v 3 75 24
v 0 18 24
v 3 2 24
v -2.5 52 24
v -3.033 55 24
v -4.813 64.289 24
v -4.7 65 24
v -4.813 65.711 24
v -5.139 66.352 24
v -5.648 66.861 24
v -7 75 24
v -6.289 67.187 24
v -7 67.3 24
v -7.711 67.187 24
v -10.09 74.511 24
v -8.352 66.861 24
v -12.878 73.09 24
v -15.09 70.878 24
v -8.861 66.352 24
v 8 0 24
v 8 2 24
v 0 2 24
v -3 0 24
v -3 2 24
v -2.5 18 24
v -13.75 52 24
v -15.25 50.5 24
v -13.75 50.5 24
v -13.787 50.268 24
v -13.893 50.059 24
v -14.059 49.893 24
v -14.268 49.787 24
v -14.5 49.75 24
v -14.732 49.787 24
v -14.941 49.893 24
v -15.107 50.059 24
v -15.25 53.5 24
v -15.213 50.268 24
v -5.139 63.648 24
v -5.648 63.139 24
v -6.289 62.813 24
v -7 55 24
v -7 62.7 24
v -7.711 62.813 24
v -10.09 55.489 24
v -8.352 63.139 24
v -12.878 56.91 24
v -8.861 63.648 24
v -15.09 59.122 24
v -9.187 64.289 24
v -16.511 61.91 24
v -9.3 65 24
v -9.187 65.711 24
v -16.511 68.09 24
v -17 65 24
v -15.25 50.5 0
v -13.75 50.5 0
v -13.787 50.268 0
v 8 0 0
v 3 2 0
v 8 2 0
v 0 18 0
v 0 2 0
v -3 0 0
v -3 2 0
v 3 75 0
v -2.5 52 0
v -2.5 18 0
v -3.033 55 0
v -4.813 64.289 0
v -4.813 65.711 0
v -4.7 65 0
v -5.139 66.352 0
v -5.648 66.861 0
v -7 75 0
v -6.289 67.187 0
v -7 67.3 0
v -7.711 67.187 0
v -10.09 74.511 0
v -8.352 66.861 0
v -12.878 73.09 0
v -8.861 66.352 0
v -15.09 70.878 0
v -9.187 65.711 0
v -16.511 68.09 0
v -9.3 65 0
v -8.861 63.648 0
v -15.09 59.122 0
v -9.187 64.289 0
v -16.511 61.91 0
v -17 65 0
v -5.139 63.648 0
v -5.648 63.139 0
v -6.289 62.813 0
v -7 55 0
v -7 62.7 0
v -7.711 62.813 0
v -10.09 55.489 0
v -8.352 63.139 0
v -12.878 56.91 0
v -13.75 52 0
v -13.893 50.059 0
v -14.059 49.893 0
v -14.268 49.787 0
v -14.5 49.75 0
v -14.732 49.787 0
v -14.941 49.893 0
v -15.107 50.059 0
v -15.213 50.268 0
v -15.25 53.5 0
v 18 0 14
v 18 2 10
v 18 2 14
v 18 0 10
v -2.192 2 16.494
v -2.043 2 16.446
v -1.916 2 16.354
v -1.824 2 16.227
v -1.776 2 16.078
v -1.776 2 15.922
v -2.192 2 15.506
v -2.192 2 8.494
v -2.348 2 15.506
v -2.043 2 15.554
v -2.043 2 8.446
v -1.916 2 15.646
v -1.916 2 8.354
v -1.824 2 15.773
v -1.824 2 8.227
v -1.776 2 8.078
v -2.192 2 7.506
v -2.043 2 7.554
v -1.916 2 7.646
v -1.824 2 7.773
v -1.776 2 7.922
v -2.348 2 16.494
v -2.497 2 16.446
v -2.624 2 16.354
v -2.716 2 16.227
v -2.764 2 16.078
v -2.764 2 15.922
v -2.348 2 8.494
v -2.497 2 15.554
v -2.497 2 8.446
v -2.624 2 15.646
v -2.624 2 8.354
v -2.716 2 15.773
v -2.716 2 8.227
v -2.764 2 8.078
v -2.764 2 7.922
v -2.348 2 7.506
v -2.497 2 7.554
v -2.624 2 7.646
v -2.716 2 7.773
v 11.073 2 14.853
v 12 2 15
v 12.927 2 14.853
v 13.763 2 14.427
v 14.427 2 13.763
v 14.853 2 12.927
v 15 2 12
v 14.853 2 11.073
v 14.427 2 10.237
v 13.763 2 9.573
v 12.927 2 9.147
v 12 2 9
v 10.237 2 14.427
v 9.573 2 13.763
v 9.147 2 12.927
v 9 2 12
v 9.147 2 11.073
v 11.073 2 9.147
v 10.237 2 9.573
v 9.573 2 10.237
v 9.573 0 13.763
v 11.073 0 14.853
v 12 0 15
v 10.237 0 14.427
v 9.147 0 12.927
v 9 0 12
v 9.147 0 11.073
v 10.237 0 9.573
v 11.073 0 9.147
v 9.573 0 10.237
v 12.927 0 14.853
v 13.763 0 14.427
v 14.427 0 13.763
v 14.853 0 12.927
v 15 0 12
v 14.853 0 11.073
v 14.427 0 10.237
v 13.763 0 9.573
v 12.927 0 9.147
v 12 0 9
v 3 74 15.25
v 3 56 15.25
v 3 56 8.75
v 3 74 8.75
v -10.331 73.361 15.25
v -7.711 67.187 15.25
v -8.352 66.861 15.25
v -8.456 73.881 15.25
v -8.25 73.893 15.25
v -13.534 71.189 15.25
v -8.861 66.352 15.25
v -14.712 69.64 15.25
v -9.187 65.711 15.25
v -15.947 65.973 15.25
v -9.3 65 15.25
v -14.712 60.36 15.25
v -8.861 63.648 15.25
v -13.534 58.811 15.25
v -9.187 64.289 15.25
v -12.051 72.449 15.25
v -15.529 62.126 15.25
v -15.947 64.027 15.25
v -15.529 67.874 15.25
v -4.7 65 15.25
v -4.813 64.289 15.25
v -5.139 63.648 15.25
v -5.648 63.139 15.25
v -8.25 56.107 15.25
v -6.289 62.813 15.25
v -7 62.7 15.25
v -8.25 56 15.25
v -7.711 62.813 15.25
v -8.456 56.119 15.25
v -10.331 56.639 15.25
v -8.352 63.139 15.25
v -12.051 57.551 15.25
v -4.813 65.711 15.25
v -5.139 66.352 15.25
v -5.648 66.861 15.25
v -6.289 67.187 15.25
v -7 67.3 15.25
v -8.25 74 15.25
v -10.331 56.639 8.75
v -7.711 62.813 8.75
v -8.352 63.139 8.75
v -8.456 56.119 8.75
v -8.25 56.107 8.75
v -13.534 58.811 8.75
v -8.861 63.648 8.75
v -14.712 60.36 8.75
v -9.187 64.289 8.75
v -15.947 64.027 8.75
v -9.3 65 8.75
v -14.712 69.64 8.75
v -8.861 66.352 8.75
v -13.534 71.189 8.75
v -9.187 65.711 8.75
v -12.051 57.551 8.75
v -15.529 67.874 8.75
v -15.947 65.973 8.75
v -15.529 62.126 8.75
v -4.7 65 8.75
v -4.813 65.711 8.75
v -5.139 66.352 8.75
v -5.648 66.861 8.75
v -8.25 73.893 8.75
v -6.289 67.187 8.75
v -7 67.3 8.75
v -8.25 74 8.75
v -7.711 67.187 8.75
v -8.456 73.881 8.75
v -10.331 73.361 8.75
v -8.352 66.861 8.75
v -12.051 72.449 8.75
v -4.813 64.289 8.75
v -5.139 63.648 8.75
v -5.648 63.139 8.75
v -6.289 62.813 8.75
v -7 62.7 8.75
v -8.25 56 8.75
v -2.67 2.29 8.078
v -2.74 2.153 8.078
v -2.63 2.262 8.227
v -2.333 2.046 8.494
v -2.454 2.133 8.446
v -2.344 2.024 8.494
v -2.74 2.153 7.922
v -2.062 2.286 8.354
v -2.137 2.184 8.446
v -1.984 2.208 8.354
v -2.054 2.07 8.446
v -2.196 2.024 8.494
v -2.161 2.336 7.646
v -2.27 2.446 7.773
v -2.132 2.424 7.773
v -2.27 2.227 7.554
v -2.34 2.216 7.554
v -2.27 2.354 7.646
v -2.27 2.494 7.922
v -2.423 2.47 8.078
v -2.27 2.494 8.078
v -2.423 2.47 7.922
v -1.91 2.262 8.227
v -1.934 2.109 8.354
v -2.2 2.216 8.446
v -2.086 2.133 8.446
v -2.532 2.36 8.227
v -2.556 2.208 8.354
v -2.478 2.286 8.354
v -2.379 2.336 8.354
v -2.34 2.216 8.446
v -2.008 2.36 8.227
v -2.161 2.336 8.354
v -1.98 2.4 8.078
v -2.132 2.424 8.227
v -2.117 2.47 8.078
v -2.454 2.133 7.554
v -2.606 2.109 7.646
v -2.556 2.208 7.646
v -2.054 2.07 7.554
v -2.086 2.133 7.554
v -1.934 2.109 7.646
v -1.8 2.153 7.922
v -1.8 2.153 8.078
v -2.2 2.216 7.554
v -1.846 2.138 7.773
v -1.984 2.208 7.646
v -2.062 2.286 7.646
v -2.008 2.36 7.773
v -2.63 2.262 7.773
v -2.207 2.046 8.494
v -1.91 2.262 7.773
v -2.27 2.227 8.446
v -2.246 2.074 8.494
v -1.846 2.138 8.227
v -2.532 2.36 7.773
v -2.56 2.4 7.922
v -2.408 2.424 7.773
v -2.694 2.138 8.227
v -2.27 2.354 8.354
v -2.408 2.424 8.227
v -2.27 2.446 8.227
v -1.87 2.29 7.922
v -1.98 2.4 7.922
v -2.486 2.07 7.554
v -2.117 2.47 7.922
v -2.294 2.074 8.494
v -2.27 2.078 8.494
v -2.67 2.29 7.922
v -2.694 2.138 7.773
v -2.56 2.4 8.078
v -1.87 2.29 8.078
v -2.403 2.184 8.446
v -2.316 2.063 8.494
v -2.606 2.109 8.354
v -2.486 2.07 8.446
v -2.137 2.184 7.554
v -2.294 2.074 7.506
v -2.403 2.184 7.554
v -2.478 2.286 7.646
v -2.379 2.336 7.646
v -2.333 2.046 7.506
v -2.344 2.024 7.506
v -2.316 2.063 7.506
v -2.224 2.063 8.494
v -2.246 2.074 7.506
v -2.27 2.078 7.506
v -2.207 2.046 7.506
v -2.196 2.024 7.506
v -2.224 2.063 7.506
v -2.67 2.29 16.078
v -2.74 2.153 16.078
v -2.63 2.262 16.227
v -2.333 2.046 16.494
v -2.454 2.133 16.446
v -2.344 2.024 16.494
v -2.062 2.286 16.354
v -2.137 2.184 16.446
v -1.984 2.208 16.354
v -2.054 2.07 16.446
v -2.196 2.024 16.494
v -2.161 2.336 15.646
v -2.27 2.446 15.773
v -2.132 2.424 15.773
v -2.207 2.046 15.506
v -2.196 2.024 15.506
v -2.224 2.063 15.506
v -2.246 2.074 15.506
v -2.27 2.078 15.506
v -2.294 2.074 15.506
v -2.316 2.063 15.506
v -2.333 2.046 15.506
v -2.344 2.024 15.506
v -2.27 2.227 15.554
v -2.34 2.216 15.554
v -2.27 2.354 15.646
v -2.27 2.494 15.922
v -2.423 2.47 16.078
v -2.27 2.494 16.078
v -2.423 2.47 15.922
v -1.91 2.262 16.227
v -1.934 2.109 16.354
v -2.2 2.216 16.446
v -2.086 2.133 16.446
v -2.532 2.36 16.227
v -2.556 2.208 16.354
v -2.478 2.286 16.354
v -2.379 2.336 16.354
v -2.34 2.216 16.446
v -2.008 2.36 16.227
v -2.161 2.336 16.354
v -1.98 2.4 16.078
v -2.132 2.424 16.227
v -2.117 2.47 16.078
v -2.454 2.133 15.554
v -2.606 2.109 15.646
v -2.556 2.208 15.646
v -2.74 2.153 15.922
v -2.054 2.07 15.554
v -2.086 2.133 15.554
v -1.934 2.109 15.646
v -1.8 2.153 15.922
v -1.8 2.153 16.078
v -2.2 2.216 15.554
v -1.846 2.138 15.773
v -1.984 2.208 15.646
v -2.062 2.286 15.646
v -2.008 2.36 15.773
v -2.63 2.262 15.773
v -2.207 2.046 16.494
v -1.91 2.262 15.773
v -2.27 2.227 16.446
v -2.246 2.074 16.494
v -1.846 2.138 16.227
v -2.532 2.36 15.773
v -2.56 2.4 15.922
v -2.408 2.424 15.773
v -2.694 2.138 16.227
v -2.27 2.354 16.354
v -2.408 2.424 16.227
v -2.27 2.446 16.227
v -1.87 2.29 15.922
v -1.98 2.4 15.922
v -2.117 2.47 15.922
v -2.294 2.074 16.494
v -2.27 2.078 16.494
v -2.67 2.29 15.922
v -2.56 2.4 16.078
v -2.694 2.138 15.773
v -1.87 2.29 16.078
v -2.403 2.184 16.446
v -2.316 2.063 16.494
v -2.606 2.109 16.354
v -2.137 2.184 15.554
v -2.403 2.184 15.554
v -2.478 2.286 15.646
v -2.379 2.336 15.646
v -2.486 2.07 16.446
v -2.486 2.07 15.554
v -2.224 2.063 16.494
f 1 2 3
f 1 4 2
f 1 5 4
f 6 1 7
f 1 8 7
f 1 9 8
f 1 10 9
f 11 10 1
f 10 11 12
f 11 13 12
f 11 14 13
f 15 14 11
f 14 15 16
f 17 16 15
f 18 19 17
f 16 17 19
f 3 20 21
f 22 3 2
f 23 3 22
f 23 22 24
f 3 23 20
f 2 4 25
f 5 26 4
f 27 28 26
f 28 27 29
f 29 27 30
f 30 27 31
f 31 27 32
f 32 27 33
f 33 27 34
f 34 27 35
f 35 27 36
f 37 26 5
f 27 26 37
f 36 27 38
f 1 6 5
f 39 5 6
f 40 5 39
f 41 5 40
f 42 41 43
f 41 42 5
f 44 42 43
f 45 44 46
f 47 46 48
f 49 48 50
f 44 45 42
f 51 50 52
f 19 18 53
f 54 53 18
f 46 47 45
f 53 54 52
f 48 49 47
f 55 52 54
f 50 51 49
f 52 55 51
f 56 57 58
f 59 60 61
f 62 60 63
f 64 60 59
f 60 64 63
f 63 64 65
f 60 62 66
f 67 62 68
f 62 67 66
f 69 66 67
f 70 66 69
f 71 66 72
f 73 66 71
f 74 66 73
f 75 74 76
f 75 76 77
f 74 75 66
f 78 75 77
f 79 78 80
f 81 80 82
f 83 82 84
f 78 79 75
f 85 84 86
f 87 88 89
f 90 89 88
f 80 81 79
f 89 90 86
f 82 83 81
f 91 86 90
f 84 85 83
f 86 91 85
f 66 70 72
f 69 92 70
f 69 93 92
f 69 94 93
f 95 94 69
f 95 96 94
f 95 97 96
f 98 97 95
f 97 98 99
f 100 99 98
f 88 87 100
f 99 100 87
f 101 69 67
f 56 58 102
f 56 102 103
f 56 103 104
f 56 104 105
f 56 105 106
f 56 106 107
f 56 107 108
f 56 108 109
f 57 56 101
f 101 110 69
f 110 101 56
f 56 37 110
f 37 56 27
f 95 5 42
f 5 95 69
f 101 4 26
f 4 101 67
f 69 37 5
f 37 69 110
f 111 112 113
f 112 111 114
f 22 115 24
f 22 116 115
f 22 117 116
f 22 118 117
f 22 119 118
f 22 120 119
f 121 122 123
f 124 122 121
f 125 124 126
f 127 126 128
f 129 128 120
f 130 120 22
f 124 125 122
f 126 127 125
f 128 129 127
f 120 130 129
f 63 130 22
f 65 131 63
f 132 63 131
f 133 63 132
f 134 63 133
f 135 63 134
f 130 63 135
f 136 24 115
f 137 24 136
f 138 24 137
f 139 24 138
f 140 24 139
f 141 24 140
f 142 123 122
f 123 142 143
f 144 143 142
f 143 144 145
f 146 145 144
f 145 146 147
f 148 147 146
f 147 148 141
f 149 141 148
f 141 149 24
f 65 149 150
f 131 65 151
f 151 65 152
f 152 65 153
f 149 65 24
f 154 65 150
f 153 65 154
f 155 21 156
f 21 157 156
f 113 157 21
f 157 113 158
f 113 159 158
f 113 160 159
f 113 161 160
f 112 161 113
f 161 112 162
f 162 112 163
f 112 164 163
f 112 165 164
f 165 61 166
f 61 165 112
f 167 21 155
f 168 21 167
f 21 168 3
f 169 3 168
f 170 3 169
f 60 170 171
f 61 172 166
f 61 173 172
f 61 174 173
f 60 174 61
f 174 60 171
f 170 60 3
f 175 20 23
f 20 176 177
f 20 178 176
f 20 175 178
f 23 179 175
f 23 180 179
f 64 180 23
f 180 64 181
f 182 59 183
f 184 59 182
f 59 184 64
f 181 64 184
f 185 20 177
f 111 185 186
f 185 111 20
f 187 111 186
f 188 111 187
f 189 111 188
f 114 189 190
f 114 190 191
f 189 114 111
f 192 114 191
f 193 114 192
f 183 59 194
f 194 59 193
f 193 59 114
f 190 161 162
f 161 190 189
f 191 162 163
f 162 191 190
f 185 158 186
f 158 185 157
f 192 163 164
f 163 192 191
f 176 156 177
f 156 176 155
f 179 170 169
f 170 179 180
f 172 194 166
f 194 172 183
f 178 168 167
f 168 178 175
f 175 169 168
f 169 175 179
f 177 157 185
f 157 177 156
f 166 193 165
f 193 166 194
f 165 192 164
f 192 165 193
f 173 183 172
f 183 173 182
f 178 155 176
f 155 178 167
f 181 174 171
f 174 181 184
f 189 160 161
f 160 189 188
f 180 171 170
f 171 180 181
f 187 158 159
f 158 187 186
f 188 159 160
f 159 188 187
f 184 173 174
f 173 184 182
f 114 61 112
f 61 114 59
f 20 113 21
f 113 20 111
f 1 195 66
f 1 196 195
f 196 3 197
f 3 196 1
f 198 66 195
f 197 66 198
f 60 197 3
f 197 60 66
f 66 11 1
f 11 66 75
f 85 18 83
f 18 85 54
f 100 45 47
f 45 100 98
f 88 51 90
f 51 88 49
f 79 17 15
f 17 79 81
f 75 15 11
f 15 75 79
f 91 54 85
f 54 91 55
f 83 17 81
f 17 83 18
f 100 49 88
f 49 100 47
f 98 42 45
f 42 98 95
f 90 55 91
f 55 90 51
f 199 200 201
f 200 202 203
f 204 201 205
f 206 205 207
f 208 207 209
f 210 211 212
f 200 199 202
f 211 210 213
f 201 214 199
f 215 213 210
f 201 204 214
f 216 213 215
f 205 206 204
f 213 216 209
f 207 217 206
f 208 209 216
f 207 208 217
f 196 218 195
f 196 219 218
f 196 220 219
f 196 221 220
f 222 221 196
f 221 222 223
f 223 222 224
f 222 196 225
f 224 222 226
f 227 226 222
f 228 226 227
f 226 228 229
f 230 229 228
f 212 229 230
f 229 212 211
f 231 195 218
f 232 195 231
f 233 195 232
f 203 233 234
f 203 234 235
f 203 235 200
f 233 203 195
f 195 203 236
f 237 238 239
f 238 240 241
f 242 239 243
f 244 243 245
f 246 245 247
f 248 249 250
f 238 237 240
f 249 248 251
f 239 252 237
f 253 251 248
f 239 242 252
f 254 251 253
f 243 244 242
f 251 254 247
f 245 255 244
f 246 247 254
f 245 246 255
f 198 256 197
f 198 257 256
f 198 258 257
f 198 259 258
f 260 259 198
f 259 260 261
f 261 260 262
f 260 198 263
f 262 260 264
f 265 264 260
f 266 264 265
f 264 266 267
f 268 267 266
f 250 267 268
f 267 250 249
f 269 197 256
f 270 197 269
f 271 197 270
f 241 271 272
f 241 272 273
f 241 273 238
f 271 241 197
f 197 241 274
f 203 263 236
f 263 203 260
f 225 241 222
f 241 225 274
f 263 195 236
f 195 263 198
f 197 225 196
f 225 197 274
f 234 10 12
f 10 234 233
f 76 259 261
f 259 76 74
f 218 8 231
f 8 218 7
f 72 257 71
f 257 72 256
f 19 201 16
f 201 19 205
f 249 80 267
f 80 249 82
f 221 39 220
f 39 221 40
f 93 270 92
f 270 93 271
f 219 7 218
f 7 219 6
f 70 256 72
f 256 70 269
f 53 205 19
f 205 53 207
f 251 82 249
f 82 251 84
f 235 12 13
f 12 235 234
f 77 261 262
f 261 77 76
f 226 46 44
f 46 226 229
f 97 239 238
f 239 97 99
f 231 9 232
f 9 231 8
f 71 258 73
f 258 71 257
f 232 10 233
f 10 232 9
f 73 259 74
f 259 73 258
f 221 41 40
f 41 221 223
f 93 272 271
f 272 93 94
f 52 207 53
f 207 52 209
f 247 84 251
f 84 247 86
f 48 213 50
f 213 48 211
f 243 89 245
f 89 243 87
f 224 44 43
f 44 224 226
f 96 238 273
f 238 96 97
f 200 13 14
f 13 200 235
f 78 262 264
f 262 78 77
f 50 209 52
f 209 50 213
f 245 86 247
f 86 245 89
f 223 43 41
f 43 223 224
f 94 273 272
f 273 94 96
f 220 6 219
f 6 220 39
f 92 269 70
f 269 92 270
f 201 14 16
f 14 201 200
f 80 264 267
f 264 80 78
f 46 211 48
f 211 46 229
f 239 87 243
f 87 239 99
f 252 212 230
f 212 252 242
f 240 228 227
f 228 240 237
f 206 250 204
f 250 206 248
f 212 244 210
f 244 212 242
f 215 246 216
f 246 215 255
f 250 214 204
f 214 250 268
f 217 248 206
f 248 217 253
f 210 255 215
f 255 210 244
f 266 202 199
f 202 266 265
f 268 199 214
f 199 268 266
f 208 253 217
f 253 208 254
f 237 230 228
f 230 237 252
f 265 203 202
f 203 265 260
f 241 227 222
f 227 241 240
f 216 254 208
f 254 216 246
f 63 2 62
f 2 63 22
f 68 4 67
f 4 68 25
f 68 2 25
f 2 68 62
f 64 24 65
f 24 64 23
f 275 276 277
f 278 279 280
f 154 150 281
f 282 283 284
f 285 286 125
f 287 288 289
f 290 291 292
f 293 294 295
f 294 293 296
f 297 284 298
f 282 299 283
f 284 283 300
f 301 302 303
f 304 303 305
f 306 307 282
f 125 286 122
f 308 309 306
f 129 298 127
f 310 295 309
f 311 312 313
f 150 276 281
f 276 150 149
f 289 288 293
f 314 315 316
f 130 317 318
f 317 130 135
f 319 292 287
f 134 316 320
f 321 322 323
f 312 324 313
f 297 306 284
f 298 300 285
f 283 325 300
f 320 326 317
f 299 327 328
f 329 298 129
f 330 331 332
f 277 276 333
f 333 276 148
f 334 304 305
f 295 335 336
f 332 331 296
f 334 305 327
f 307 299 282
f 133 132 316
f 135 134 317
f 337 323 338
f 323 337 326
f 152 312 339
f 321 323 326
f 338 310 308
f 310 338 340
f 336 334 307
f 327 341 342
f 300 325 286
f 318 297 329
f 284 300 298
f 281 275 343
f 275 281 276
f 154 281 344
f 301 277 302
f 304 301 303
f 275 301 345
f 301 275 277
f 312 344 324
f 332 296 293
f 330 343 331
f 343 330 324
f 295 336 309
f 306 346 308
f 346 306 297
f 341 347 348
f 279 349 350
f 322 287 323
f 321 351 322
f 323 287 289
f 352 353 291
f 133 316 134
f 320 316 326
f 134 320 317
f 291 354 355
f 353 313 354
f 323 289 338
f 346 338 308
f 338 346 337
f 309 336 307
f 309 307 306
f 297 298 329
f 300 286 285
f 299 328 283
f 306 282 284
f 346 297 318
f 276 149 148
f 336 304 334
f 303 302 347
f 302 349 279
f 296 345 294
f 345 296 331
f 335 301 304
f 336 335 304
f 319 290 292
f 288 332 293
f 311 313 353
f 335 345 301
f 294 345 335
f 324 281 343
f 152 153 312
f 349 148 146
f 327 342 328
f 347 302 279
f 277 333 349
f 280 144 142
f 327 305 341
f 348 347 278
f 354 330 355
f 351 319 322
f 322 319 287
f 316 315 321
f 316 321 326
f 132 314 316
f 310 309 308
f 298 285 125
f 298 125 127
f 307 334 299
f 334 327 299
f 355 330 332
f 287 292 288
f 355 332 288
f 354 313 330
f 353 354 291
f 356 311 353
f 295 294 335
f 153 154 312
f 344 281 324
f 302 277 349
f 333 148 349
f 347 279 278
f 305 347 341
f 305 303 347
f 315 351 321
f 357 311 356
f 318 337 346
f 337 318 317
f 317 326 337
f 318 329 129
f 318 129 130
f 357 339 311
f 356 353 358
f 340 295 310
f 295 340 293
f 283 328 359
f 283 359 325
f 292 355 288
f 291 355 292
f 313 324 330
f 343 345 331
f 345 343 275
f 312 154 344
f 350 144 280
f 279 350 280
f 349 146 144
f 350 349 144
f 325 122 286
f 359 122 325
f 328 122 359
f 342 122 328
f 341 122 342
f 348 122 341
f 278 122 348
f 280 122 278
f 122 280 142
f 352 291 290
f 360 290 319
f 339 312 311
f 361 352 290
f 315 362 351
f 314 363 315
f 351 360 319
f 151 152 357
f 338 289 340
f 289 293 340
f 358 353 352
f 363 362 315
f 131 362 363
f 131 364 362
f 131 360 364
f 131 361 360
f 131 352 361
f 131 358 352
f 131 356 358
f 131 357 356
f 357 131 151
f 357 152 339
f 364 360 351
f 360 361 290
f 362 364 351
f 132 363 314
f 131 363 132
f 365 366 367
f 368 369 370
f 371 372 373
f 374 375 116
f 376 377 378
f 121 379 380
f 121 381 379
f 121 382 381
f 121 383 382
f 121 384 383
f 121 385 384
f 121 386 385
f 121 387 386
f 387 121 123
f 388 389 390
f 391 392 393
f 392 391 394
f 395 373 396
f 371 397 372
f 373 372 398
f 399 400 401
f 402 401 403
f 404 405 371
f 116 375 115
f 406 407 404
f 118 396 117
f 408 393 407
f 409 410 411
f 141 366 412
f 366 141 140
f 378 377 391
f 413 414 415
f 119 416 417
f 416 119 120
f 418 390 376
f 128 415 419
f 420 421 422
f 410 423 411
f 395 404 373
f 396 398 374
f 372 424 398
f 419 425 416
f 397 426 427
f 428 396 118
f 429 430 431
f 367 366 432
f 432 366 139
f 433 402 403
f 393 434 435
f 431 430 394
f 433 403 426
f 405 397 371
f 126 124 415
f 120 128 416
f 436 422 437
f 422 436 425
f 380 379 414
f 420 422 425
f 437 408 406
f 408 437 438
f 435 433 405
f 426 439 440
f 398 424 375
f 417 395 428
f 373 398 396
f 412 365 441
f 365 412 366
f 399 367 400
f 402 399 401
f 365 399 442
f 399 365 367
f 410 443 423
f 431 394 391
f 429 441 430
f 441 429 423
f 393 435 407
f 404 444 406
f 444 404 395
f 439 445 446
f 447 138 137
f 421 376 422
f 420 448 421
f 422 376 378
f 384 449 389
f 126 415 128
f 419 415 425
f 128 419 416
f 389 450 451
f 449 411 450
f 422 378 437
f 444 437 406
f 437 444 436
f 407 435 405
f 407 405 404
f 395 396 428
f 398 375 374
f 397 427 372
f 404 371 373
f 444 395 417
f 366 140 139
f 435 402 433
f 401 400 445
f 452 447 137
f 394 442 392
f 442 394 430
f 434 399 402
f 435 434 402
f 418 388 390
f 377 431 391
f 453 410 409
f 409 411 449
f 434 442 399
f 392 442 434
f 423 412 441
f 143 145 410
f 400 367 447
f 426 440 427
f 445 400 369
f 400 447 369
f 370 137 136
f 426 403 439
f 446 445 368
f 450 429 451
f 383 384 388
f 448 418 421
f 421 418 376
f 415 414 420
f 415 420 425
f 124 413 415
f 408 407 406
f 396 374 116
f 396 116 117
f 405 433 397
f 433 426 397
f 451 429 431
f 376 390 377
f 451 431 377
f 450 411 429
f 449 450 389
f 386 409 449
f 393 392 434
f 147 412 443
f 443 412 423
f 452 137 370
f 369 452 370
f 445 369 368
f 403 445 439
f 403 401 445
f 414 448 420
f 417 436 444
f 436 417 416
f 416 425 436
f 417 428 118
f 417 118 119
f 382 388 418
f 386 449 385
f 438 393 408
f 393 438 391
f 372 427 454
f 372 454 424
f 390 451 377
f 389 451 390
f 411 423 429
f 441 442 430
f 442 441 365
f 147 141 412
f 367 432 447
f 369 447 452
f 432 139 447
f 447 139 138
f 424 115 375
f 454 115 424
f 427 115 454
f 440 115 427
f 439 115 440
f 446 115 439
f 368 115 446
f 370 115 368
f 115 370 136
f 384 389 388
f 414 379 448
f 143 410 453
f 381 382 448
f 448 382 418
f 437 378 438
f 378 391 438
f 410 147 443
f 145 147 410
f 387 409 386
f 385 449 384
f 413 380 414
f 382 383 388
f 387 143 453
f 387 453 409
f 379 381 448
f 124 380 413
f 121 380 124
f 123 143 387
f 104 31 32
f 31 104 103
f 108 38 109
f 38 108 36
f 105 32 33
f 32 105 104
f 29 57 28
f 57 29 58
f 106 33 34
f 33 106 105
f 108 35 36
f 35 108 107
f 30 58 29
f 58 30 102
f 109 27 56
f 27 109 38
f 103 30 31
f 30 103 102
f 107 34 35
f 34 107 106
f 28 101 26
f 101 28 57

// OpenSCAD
// Dial Gauge (Harbor Freight/Pittsburg item 623) clip

// Modified by Laird Popkin <laird@popk.in> to fit the Pittsburg Travel Machinist's 
// Dial Indicator, item 623 (as sold by Harbor Freight).

// First, install the guage into the clip. To do this, first put the end of the probe through the guide hole
// in the triangle at the bottom of the clip, then put the log back (the hoop on the back of the dial) into the
// slot at the top of the clip, and hold in place with an M4 bolt (e.g. M4-30 or longer) and an M4 nut.

// It clips to the front of the Makerbot Replicator carriage. The top hooks over the fans, and the bottom then
// snaps under the bottom of the carriage. This puts the dial guage vertical, with the dial facing the front 
// so that it is easily readable, with the probe just below the level of the extruders.

// If you're running the Sailfish firmware, the "level build plate" command moves the build plate up into
// position, and disengages the X and Y stepper motors, allowing you to move the extruder carriage freely.

// Adjust the print bed to the proper height in the center, ideally using a feeler guage (0.001 in), then
// move the probe there and set the 'zero' of the dial indicator to that position. Then move the guage around 
// the print bed and adjust the print bed's height to be 'zero' on the guage. 

width = 24;
height=55;
shaftrad = 3; //2.15;  // this gave a slip fit on mine, might go 2.1 or less for a friction fit.
				 // or whatever fits your guage.
shaftx = 12;	// position of shaft in front of origin
hoopthickness = 6.5; // thickness of hoop on back of gauge
hoopheight = 20;	// height of hoop on back of gauge
boltrad = 2.3;		// size of bolt through back of gauge
t=1;					// thickness of walls around hook
t2=3;					// thickness around guide hole

// vertical sections and bottom clip
cube (size = [3, height, width]);
translate ([-2.5, 18, 0]) cube (size = [3, 35, width]);
translate ([-3, 0, 0]) cube (size = [7, 2, width]);
// these two bumps help retain the fixture
translate ([-2.27, 2, 8]) sphere (r = .5, $fn = 20);
translate ([-2.27, 2, width - 8]) sphere (r = .5, $fn = 20);

difference () {
// top clip
	translate ([-15.25, 52, 0]) cube (size = [17.5, 3, width]);
	// slanting the top clip
	translate ([-15.25, 53.5, 0]) rotate (a = [0, 0, 7]) cube (size = [18.5, 3, width]);
	// these 3mm holes could be used for set screws if the fixture is loose
	//translate ([-5, 58, 17]) rotate (a = [90, 0, 0]) cylinder (h = 10, r = 1.5, $fn = 20);
	//translate ([-5, 58, 7]) rotate (a = [90, 0, 0]) cylinder (h = 10, r = 1.5, $fn = 20);
}

// top clip hook
translate ([-14.5, 50.5, 0]) cylinder (h = width, r = .75, $fn = 20);
translate ([-15.25, 50.5, 0]) cube (size = [1.5, 3, width]);

difference () {
// guage mount
	// main block
	translate ([0, 0, 0]) cube (size = [shaftx+shaftrad+t2, 2, width]);
	// vertical hole for guage
	translate ([shaftx, -1, 12]) rotate (a = [-90, 0, 0]) cylinder (h = 17, r = shaftrad, $fn = 20);
	// trim the excess corners of the block
	translate ([shaftx-7+t2, -1, 0]) rotate (a = [0, 45, 0]) cube (size = [20, 20, 20]);
	translate ([shaftx-7+t2, -1, width]) rotate (a = [0, 45, 0]) cube (size = [20, 20, 20]);	
	// set screw hole, for 3mm screw
	translate ([shaftx, 5, width / 2]) rotate (a = [0, 90, 0]) cylinder (h = 10, r = 1.5, $fn = 20);
}

echo(hoopheight,hoopheight,width);
translate([-hoopheight+3,55,0]) difference() {
	union () {
		translate([hoopheight/2,0,0]) cube([hoopheight/2,hoopheight,width]);
		translate([hoopheight/2, hoopheight/2, 0]) cylinder(r=hoopheight/2, h=width, $fn=20);
		}
	translate([(width-hoopthickness)/2,t,(width-hoopthickness)/2]) cube([hoopheight,hoopheight-2*t,hoopthickness]);
	translate([hoopheight/2,hoopheight/2,-1]) cylinder(r=boltrad, h=width+2, $fn=20);
	translate([hoopheight/2, hoopheight/2, (width-hoopthickness)/2]) cylinder(r=hoopheight/2-t, h=hoopthickness);
	}

//translate([-20,73,13.5]) rotate([90,180,0]) import("Dial_Indicator_Mount_V2_Part.stl");
